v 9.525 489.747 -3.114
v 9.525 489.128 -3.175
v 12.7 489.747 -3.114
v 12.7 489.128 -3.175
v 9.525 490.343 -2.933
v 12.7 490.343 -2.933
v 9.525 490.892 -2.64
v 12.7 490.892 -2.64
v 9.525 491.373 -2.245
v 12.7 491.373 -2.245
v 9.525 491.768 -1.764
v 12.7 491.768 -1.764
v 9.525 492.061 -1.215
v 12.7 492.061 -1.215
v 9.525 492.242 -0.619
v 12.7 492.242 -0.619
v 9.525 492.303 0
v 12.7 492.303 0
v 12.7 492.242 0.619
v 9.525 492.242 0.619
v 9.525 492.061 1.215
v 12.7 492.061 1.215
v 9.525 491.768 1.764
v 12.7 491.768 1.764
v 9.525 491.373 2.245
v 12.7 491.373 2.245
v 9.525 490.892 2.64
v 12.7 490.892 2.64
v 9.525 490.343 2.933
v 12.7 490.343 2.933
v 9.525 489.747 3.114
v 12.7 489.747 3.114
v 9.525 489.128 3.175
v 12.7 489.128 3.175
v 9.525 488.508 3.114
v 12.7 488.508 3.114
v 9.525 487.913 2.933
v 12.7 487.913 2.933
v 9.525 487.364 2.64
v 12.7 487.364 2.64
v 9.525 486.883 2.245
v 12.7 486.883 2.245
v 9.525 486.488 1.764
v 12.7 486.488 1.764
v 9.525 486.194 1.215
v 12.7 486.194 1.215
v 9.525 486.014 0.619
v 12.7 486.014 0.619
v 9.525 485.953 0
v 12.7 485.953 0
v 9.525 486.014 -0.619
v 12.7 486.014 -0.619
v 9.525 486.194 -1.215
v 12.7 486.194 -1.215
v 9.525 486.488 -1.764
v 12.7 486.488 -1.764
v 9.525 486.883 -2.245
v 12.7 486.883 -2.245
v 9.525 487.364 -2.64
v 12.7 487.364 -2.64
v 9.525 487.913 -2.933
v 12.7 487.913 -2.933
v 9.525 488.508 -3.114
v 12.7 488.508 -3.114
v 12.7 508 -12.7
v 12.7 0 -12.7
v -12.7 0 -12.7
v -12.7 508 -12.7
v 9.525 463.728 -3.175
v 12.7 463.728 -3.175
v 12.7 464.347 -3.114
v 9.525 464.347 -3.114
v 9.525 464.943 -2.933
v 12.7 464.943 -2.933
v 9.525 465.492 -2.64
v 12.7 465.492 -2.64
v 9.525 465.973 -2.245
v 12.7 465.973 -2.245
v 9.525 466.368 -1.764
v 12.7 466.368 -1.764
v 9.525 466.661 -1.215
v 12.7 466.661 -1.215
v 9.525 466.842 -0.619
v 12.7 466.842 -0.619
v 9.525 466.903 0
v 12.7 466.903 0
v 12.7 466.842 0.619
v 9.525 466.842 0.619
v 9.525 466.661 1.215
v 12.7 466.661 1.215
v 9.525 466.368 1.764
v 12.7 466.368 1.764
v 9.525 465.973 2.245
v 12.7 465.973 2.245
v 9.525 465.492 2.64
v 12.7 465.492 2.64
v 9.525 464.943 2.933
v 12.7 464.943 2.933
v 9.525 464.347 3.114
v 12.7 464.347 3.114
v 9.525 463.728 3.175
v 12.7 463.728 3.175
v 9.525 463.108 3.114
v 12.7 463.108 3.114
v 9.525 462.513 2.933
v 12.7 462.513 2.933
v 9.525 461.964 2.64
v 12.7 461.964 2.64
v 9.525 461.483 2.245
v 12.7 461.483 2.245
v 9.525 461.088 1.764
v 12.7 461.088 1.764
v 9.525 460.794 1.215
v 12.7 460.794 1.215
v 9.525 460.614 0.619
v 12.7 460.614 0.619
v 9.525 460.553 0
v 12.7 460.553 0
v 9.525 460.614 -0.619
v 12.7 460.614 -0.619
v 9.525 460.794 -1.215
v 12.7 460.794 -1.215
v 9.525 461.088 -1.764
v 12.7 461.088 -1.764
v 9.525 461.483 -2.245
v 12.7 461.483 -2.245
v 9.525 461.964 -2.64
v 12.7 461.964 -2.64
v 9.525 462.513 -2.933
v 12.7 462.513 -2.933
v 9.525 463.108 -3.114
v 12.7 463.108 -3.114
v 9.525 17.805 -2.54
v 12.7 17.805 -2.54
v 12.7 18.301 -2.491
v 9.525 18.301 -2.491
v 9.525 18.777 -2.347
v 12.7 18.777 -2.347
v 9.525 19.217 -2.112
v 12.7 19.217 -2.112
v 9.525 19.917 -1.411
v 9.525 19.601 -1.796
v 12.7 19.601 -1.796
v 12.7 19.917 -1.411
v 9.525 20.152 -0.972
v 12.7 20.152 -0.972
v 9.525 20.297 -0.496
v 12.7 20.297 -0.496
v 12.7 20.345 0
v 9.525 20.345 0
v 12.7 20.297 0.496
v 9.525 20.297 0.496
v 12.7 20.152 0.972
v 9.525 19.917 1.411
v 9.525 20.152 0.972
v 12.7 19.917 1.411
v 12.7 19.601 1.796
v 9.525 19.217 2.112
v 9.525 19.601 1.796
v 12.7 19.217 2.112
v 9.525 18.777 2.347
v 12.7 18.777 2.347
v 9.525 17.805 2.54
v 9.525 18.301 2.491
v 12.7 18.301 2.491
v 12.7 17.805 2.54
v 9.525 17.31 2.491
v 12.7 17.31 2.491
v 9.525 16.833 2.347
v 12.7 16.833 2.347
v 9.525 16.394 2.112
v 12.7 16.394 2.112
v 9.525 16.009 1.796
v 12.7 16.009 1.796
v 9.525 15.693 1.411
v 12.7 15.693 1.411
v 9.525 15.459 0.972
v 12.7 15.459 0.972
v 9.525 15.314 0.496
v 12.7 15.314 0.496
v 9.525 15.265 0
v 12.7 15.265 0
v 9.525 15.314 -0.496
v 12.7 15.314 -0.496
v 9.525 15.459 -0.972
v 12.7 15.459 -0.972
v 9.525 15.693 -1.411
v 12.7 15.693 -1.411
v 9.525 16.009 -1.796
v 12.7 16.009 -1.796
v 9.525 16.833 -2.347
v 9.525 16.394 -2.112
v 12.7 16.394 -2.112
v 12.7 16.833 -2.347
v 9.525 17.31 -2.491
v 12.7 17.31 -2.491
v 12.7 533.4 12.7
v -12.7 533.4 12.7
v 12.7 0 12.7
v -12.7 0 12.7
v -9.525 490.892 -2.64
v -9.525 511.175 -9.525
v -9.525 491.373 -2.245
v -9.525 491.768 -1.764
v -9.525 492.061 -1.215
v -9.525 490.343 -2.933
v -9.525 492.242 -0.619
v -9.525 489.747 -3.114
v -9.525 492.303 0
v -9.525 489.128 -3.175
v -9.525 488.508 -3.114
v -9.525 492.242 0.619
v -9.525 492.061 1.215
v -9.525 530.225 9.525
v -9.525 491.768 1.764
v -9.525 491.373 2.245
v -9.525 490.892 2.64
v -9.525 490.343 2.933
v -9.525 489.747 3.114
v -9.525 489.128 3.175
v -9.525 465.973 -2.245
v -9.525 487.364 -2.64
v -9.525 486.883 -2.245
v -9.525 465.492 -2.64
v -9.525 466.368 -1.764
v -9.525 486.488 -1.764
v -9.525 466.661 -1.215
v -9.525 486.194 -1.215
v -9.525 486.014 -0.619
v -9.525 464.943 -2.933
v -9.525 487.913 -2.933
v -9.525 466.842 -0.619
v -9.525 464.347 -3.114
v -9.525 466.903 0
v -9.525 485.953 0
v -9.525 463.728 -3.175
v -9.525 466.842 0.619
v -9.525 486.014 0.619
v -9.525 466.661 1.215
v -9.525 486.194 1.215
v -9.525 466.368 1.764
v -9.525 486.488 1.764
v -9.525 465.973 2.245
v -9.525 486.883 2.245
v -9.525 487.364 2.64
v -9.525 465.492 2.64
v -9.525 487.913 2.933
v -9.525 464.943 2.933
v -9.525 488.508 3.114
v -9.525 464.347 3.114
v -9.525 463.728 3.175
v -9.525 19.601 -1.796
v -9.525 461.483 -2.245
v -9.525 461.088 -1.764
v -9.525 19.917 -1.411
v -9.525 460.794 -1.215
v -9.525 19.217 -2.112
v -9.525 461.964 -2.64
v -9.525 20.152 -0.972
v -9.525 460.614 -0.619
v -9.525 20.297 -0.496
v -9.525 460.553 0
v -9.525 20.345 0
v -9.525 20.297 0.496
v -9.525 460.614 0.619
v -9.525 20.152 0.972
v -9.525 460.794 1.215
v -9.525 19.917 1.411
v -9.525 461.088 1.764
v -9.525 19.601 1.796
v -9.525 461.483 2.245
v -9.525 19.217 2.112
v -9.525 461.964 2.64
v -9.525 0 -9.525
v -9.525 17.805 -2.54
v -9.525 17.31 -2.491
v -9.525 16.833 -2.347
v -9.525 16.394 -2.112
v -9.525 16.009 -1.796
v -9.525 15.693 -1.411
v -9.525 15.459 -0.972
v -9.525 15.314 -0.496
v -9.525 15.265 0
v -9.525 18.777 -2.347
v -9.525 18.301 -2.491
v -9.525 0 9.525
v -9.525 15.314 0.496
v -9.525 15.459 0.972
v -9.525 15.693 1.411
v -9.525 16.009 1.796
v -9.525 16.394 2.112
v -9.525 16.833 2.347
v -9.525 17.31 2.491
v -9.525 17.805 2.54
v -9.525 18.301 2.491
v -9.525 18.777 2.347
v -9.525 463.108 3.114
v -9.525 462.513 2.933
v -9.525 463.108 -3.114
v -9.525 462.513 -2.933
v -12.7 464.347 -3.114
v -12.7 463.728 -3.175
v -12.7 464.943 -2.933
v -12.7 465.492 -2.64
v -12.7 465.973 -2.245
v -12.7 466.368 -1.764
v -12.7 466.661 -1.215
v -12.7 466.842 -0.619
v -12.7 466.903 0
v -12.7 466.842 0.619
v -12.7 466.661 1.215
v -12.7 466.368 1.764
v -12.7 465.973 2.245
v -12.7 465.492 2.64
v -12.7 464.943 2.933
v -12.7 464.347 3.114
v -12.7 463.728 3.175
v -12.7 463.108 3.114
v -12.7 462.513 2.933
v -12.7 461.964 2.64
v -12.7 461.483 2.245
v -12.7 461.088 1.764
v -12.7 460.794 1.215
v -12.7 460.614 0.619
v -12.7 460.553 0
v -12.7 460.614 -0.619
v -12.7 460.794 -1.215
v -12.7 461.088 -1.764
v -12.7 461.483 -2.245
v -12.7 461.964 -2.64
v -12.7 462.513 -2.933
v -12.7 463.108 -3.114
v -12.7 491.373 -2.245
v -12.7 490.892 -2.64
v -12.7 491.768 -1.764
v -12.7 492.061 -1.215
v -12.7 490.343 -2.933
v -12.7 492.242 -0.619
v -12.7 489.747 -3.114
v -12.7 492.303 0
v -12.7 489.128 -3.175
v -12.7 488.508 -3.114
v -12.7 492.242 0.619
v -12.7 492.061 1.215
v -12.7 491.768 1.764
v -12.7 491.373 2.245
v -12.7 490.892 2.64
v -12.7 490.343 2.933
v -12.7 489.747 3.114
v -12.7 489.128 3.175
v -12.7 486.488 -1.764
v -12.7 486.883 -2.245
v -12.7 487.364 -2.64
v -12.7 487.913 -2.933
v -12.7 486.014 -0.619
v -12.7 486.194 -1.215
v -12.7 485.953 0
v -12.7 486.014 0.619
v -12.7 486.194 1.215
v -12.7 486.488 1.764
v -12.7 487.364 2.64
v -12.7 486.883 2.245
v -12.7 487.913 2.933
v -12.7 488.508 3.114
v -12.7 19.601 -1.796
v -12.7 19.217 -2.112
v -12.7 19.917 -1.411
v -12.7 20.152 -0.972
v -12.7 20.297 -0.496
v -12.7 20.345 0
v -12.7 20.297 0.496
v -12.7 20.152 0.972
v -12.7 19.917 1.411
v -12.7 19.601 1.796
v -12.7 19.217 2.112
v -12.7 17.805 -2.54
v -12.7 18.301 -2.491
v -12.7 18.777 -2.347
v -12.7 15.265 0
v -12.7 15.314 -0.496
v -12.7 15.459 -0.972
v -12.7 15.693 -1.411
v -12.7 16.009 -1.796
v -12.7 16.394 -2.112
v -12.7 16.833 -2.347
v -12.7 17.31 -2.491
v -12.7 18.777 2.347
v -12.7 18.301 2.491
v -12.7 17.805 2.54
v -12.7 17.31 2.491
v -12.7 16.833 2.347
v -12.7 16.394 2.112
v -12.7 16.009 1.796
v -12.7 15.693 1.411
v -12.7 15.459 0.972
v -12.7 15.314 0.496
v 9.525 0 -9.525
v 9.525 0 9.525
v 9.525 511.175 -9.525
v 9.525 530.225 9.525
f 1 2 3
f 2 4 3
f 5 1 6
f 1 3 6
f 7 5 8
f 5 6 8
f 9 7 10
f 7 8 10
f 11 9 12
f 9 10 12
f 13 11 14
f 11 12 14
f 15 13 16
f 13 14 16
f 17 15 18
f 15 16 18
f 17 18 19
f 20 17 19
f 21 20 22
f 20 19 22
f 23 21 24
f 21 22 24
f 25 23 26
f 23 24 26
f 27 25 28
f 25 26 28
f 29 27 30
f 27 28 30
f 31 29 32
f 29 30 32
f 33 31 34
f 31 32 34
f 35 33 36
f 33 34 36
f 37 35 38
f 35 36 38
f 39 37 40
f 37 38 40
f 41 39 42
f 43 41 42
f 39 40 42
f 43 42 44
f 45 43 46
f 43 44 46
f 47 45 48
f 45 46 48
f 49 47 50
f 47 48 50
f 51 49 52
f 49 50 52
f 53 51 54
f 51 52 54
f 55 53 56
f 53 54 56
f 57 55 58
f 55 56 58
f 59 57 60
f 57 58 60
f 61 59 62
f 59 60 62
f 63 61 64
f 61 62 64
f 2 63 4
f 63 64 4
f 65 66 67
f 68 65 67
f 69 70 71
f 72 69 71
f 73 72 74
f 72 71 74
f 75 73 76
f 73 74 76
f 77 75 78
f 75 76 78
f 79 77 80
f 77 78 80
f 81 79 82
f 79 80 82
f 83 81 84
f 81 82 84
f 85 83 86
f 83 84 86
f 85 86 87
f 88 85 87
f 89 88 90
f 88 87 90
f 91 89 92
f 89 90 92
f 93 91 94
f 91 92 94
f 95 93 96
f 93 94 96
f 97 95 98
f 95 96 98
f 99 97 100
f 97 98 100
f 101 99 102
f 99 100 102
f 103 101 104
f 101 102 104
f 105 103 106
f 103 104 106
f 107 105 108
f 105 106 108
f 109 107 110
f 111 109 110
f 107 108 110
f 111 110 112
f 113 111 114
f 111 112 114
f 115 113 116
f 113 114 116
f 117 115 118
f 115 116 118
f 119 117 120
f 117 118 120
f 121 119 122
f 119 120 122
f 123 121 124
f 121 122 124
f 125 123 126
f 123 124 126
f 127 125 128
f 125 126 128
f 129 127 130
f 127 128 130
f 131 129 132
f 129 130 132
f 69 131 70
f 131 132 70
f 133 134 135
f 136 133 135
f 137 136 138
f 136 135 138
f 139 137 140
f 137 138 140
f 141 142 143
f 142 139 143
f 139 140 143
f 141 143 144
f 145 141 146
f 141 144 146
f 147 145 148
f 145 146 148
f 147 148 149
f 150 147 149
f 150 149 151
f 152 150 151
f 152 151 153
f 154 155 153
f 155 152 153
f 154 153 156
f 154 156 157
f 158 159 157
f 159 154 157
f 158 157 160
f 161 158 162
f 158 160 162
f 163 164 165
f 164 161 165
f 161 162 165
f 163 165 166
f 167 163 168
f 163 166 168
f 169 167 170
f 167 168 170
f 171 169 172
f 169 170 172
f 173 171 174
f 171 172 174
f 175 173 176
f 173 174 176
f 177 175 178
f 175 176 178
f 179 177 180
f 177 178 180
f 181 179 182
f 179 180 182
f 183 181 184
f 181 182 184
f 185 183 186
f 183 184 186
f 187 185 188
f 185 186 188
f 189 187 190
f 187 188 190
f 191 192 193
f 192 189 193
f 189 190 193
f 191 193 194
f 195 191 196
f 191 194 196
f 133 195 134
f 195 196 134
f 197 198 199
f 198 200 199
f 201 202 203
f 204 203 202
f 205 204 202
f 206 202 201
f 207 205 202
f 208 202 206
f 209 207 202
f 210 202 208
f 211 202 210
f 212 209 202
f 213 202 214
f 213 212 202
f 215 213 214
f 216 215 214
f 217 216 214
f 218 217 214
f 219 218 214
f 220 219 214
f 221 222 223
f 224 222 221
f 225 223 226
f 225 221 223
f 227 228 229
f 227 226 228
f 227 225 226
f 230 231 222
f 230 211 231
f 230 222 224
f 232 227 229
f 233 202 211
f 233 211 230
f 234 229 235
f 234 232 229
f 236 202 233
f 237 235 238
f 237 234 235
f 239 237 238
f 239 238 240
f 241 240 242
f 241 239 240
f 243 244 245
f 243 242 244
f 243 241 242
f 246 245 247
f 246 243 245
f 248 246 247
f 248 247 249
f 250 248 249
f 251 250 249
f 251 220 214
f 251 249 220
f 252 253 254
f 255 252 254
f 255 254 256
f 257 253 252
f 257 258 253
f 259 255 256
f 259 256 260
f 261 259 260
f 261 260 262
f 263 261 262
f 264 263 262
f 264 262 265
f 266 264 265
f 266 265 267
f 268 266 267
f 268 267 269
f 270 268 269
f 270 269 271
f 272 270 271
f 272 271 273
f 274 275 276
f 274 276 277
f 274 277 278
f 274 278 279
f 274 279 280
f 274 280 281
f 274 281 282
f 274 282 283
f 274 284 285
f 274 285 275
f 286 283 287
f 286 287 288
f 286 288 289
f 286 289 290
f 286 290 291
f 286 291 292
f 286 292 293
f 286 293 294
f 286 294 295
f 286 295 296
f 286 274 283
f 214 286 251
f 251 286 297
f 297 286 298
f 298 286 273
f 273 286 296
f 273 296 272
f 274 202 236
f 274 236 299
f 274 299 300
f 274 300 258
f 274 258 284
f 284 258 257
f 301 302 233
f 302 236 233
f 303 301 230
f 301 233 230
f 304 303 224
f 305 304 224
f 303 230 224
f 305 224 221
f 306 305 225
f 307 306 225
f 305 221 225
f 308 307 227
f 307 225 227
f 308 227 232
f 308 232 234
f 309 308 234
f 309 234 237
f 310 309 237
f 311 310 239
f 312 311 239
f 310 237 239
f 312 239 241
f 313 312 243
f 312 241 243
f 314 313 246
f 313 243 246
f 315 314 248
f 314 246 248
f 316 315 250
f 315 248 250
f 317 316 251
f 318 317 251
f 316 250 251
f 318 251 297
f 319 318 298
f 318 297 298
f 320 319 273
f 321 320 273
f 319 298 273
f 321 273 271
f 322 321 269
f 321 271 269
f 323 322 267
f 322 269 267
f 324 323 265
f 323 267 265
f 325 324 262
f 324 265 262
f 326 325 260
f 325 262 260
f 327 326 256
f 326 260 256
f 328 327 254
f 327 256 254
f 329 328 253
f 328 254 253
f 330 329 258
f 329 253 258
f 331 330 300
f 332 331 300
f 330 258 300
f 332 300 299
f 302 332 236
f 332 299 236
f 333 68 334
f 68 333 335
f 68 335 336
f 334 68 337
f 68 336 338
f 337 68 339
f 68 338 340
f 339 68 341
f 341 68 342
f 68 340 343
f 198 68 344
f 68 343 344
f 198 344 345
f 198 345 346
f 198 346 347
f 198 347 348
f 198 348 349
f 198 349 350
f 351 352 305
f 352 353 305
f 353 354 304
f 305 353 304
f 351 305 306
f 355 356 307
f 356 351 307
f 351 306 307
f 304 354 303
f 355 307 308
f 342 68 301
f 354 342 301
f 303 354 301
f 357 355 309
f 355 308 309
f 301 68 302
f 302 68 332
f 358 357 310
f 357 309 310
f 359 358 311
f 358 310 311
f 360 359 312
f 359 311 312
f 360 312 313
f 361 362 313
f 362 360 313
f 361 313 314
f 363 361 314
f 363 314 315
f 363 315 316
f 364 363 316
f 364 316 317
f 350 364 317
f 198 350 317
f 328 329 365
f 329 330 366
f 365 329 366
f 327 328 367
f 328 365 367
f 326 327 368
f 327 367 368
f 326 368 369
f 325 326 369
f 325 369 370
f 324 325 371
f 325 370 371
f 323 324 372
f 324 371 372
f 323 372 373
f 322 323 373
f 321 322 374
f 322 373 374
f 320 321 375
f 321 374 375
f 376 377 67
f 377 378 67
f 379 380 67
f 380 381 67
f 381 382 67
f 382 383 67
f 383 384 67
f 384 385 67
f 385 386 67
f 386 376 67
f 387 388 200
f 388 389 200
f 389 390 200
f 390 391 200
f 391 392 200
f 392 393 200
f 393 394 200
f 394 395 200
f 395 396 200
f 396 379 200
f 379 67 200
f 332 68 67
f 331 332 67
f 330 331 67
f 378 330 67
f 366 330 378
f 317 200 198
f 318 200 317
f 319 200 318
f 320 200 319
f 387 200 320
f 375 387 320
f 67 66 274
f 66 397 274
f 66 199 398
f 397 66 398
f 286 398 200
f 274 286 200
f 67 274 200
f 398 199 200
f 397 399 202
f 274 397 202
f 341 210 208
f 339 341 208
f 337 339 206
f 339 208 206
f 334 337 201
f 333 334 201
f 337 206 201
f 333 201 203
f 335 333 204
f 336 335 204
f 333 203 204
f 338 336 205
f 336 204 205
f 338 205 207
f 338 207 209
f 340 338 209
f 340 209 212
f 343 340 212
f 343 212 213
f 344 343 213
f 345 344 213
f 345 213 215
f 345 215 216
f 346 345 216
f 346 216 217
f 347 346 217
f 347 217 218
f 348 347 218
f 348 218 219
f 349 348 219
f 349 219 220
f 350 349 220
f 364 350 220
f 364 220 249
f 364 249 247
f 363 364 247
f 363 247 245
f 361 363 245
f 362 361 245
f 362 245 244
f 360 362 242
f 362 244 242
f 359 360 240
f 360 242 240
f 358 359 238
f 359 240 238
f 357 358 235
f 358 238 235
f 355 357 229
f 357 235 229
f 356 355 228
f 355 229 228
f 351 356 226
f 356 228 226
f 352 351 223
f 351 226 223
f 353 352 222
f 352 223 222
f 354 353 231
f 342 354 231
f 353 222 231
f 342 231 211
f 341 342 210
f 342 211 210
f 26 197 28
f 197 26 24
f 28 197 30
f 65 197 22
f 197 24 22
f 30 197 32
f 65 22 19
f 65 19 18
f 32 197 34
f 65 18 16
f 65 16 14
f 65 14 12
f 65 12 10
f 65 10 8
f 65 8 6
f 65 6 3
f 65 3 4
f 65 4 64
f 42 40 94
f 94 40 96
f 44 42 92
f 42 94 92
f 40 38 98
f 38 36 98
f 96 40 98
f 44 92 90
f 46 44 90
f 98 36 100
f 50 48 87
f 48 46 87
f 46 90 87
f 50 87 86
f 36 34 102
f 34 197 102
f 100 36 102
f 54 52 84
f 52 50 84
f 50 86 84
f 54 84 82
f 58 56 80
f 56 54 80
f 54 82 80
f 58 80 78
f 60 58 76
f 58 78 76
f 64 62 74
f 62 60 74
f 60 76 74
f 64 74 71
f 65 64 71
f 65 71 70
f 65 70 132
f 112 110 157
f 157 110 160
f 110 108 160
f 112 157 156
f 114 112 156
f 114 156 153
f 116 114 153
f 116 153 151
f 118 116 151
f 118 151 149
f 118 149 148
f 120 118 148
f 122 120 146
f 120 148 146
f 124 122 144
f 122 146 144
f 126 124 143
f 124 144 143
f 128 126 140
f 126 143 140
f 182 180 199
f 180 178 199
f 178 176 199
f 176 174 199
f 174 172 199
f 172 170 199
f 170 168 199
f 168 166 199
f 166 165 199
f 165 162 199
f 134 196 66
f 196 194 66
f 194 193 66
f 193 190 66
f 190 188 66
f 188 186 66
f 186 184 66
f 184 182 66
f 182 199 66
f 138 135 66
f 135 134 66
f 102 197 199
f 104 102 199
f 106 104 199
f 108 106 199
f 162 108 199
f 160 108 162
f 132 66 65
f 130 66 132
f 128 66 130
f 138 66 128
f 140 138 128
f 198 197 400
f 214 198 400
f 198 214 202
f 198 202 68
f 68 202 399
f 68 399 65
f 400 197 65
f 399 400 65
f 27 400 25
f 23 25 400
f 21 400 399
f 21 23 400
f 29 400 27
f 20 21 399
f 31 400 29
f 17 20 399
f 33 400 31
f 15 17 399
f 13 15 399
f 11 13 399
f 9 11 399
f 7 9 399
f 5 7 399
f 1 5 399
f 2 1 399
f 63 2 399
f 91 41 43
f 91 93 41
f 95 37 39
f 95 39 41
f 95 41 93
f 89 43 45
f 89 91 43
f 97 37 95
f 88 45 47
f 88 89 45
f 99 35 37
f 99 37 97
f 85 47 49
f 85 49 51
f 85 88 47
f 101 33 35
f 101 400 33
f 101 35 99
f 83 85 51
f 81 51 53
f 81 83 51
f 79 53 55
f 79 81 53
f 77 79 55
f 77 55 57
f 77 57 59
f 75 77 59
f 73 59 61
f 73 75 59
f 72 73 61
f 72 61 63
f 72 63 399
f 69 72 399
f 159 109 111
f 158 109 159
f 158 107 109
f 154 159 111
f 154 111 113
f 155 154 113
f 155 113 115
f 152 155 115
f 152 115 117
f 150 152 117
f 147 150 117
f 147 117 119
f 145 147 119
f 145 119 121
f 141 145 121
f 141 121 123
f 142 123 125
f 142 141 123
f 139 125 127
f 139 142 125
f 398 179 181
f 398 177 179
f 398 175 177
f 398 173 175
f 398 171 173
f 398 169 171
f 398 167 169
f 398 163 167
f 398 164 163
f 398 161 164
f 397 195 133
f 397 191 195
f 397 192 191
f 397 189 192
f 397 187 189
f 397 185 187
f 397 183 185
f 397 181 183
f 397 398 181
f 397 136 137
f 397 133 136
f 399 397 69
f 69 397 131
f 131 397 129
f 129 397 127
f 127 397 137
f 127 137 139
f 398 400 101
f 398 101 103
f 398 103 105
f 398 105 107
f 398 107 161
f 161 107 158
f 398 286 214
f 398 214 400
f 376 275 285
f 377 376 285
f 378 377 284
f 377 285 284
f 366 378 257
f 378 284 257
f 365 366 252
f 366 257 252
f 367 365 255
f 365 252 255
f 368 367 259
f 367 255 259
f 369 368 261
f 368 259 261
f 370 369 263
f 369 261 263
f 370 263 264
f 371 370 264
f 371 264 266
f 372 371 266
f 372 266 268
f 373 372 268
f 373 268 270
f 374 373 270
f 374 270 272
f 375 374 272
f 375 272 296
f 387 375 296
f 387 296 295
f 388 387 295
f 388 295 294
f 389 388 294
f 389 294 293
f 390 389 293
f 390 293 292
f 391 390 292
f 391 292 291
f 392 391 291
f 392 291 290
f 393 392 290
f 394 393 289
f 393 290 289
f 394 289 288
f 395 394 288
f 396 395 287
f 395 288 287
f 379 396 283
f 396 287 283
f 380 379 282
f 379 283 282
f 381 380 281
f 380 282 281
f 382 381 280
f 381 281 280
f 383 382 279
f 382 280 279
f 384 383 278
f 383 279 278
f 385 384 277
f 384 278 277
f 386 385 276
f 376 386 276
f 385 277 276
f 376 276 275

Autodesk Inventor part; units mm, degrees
ref_plane "YZ Plane" through (0, 0, 0) normal (1, 0, 0) x (0, 1, 0)
ref_plane "XZ Plane" through (0, 0, 0) normal (0, 1, 0) x (-1, 0, 0)
ref_plane "XY Plane" through (0, 0, 0) normal (0, 0, 1) x (1, 0, 0)
sketch "Sketch1" plane through (0, 0, 0) normal (0, 1, 0) x (-1, 0, 0)
  line L0 (-12.7, -12.7) -> (12.7, -12.7)
  line L1 (12.7, -12.7) -> (12.7, 12.7)
  line L2 (12.7, 12.7) -> (-12.7, 12.7)
  line L3 (-12.7, 12.7) -> (-12.7, -12.7)
  line L4 (-12.7, -12.7) -> (12.7, 12.7) construction
  line L5 (12.7, -12.7) -> (-12.7, 12.7) construction
  line L6 (-9.525, -9.525) -> (9.525, -9.525)
  line L7 (9.525, -9.525) -> (9.525, 9.525)
  line L8 (9.525, 9.525) -> (-9.525, 9.525)
  line L9 (-9.525, 9.525) -> (-9.525, -9.525)
  line L10 (-9.525, -9.525) -> (9.525, 9.525) construction
  line L11 (9.525, -9.525) -> (-9.525, 9.525) construction
  point P0 (0, 0)
  dimension "d0" = 25.4
  dimension "d1" = 25.4
  dimension "d2" = 19.05
  dimension "d3" = 19.05
extrude "Extrusion1" add sketch "Sketch1" along normal blind 533.4
sketch "Sketch2" plane through (12.7, 0, 12.7) normal (1, 0, 0) x (0, 0, -1)
  line L0 (25.4, 0) -> (25.4, 533.4) projected
  line L1 (0, 533.4) -> (25.4, 533.4) projected
  line L2 (0, 533.4) -> (25.4, 508)
  line L3 (0, 533.4) -> (35.921, 533.4) construction
  point P0 (12.7, 0)
  dimension "d6" = 45
extrude "Extrusion2" cut sketch "Sketch2" against normal blind 25.4
sketch "Sketch3" plane through (12.7, 0, 12.7) normal (1, 0, 0) x (0, 0, -1)
  line L0 (25.4, 0) -> (25.4, 508) projected
  line L1 (12.7, 0) -> (12.7, 17.8054)
  circle A0 centre (12.7, 17.8054) radius 2.54
  dimension "d9" = 17.8054
  dimension "d10" = 5.08
extrude "Extrusion3" cut sketch "Sketch3" against normal blind 25.4
sketch "Sketch4" plane through (12.7, 0, 12.7) normal (1, 0, 0) x (0, 0, -1)
  line L0 (25.4, 0) -> (25.4, 508) projected
  line L1 (12.7, 0) -> (12.7, 463.7278)
  line L2 (12.7, 0) -> (476.4278, 0) construction
  line L3 (12.7, 463.7278) -> (12.7, 489.1278)
  circle A0 centre (12.7, 489.1278) radius 3.175
  circle A1 centre (12.7, 463.7278) radius 3.175
  dimension "d13" = 463.7278
  dimension "d14" = 90
  dimension "d15" = 25.4
  dimension "d16" = 180
  dimension "d17" = 6.35
  dimension "d18" = 6.35
extrude "Extrusion4" cut sketch "Sketch4" against normal blind 25.4
properties part number "TestSupport"
